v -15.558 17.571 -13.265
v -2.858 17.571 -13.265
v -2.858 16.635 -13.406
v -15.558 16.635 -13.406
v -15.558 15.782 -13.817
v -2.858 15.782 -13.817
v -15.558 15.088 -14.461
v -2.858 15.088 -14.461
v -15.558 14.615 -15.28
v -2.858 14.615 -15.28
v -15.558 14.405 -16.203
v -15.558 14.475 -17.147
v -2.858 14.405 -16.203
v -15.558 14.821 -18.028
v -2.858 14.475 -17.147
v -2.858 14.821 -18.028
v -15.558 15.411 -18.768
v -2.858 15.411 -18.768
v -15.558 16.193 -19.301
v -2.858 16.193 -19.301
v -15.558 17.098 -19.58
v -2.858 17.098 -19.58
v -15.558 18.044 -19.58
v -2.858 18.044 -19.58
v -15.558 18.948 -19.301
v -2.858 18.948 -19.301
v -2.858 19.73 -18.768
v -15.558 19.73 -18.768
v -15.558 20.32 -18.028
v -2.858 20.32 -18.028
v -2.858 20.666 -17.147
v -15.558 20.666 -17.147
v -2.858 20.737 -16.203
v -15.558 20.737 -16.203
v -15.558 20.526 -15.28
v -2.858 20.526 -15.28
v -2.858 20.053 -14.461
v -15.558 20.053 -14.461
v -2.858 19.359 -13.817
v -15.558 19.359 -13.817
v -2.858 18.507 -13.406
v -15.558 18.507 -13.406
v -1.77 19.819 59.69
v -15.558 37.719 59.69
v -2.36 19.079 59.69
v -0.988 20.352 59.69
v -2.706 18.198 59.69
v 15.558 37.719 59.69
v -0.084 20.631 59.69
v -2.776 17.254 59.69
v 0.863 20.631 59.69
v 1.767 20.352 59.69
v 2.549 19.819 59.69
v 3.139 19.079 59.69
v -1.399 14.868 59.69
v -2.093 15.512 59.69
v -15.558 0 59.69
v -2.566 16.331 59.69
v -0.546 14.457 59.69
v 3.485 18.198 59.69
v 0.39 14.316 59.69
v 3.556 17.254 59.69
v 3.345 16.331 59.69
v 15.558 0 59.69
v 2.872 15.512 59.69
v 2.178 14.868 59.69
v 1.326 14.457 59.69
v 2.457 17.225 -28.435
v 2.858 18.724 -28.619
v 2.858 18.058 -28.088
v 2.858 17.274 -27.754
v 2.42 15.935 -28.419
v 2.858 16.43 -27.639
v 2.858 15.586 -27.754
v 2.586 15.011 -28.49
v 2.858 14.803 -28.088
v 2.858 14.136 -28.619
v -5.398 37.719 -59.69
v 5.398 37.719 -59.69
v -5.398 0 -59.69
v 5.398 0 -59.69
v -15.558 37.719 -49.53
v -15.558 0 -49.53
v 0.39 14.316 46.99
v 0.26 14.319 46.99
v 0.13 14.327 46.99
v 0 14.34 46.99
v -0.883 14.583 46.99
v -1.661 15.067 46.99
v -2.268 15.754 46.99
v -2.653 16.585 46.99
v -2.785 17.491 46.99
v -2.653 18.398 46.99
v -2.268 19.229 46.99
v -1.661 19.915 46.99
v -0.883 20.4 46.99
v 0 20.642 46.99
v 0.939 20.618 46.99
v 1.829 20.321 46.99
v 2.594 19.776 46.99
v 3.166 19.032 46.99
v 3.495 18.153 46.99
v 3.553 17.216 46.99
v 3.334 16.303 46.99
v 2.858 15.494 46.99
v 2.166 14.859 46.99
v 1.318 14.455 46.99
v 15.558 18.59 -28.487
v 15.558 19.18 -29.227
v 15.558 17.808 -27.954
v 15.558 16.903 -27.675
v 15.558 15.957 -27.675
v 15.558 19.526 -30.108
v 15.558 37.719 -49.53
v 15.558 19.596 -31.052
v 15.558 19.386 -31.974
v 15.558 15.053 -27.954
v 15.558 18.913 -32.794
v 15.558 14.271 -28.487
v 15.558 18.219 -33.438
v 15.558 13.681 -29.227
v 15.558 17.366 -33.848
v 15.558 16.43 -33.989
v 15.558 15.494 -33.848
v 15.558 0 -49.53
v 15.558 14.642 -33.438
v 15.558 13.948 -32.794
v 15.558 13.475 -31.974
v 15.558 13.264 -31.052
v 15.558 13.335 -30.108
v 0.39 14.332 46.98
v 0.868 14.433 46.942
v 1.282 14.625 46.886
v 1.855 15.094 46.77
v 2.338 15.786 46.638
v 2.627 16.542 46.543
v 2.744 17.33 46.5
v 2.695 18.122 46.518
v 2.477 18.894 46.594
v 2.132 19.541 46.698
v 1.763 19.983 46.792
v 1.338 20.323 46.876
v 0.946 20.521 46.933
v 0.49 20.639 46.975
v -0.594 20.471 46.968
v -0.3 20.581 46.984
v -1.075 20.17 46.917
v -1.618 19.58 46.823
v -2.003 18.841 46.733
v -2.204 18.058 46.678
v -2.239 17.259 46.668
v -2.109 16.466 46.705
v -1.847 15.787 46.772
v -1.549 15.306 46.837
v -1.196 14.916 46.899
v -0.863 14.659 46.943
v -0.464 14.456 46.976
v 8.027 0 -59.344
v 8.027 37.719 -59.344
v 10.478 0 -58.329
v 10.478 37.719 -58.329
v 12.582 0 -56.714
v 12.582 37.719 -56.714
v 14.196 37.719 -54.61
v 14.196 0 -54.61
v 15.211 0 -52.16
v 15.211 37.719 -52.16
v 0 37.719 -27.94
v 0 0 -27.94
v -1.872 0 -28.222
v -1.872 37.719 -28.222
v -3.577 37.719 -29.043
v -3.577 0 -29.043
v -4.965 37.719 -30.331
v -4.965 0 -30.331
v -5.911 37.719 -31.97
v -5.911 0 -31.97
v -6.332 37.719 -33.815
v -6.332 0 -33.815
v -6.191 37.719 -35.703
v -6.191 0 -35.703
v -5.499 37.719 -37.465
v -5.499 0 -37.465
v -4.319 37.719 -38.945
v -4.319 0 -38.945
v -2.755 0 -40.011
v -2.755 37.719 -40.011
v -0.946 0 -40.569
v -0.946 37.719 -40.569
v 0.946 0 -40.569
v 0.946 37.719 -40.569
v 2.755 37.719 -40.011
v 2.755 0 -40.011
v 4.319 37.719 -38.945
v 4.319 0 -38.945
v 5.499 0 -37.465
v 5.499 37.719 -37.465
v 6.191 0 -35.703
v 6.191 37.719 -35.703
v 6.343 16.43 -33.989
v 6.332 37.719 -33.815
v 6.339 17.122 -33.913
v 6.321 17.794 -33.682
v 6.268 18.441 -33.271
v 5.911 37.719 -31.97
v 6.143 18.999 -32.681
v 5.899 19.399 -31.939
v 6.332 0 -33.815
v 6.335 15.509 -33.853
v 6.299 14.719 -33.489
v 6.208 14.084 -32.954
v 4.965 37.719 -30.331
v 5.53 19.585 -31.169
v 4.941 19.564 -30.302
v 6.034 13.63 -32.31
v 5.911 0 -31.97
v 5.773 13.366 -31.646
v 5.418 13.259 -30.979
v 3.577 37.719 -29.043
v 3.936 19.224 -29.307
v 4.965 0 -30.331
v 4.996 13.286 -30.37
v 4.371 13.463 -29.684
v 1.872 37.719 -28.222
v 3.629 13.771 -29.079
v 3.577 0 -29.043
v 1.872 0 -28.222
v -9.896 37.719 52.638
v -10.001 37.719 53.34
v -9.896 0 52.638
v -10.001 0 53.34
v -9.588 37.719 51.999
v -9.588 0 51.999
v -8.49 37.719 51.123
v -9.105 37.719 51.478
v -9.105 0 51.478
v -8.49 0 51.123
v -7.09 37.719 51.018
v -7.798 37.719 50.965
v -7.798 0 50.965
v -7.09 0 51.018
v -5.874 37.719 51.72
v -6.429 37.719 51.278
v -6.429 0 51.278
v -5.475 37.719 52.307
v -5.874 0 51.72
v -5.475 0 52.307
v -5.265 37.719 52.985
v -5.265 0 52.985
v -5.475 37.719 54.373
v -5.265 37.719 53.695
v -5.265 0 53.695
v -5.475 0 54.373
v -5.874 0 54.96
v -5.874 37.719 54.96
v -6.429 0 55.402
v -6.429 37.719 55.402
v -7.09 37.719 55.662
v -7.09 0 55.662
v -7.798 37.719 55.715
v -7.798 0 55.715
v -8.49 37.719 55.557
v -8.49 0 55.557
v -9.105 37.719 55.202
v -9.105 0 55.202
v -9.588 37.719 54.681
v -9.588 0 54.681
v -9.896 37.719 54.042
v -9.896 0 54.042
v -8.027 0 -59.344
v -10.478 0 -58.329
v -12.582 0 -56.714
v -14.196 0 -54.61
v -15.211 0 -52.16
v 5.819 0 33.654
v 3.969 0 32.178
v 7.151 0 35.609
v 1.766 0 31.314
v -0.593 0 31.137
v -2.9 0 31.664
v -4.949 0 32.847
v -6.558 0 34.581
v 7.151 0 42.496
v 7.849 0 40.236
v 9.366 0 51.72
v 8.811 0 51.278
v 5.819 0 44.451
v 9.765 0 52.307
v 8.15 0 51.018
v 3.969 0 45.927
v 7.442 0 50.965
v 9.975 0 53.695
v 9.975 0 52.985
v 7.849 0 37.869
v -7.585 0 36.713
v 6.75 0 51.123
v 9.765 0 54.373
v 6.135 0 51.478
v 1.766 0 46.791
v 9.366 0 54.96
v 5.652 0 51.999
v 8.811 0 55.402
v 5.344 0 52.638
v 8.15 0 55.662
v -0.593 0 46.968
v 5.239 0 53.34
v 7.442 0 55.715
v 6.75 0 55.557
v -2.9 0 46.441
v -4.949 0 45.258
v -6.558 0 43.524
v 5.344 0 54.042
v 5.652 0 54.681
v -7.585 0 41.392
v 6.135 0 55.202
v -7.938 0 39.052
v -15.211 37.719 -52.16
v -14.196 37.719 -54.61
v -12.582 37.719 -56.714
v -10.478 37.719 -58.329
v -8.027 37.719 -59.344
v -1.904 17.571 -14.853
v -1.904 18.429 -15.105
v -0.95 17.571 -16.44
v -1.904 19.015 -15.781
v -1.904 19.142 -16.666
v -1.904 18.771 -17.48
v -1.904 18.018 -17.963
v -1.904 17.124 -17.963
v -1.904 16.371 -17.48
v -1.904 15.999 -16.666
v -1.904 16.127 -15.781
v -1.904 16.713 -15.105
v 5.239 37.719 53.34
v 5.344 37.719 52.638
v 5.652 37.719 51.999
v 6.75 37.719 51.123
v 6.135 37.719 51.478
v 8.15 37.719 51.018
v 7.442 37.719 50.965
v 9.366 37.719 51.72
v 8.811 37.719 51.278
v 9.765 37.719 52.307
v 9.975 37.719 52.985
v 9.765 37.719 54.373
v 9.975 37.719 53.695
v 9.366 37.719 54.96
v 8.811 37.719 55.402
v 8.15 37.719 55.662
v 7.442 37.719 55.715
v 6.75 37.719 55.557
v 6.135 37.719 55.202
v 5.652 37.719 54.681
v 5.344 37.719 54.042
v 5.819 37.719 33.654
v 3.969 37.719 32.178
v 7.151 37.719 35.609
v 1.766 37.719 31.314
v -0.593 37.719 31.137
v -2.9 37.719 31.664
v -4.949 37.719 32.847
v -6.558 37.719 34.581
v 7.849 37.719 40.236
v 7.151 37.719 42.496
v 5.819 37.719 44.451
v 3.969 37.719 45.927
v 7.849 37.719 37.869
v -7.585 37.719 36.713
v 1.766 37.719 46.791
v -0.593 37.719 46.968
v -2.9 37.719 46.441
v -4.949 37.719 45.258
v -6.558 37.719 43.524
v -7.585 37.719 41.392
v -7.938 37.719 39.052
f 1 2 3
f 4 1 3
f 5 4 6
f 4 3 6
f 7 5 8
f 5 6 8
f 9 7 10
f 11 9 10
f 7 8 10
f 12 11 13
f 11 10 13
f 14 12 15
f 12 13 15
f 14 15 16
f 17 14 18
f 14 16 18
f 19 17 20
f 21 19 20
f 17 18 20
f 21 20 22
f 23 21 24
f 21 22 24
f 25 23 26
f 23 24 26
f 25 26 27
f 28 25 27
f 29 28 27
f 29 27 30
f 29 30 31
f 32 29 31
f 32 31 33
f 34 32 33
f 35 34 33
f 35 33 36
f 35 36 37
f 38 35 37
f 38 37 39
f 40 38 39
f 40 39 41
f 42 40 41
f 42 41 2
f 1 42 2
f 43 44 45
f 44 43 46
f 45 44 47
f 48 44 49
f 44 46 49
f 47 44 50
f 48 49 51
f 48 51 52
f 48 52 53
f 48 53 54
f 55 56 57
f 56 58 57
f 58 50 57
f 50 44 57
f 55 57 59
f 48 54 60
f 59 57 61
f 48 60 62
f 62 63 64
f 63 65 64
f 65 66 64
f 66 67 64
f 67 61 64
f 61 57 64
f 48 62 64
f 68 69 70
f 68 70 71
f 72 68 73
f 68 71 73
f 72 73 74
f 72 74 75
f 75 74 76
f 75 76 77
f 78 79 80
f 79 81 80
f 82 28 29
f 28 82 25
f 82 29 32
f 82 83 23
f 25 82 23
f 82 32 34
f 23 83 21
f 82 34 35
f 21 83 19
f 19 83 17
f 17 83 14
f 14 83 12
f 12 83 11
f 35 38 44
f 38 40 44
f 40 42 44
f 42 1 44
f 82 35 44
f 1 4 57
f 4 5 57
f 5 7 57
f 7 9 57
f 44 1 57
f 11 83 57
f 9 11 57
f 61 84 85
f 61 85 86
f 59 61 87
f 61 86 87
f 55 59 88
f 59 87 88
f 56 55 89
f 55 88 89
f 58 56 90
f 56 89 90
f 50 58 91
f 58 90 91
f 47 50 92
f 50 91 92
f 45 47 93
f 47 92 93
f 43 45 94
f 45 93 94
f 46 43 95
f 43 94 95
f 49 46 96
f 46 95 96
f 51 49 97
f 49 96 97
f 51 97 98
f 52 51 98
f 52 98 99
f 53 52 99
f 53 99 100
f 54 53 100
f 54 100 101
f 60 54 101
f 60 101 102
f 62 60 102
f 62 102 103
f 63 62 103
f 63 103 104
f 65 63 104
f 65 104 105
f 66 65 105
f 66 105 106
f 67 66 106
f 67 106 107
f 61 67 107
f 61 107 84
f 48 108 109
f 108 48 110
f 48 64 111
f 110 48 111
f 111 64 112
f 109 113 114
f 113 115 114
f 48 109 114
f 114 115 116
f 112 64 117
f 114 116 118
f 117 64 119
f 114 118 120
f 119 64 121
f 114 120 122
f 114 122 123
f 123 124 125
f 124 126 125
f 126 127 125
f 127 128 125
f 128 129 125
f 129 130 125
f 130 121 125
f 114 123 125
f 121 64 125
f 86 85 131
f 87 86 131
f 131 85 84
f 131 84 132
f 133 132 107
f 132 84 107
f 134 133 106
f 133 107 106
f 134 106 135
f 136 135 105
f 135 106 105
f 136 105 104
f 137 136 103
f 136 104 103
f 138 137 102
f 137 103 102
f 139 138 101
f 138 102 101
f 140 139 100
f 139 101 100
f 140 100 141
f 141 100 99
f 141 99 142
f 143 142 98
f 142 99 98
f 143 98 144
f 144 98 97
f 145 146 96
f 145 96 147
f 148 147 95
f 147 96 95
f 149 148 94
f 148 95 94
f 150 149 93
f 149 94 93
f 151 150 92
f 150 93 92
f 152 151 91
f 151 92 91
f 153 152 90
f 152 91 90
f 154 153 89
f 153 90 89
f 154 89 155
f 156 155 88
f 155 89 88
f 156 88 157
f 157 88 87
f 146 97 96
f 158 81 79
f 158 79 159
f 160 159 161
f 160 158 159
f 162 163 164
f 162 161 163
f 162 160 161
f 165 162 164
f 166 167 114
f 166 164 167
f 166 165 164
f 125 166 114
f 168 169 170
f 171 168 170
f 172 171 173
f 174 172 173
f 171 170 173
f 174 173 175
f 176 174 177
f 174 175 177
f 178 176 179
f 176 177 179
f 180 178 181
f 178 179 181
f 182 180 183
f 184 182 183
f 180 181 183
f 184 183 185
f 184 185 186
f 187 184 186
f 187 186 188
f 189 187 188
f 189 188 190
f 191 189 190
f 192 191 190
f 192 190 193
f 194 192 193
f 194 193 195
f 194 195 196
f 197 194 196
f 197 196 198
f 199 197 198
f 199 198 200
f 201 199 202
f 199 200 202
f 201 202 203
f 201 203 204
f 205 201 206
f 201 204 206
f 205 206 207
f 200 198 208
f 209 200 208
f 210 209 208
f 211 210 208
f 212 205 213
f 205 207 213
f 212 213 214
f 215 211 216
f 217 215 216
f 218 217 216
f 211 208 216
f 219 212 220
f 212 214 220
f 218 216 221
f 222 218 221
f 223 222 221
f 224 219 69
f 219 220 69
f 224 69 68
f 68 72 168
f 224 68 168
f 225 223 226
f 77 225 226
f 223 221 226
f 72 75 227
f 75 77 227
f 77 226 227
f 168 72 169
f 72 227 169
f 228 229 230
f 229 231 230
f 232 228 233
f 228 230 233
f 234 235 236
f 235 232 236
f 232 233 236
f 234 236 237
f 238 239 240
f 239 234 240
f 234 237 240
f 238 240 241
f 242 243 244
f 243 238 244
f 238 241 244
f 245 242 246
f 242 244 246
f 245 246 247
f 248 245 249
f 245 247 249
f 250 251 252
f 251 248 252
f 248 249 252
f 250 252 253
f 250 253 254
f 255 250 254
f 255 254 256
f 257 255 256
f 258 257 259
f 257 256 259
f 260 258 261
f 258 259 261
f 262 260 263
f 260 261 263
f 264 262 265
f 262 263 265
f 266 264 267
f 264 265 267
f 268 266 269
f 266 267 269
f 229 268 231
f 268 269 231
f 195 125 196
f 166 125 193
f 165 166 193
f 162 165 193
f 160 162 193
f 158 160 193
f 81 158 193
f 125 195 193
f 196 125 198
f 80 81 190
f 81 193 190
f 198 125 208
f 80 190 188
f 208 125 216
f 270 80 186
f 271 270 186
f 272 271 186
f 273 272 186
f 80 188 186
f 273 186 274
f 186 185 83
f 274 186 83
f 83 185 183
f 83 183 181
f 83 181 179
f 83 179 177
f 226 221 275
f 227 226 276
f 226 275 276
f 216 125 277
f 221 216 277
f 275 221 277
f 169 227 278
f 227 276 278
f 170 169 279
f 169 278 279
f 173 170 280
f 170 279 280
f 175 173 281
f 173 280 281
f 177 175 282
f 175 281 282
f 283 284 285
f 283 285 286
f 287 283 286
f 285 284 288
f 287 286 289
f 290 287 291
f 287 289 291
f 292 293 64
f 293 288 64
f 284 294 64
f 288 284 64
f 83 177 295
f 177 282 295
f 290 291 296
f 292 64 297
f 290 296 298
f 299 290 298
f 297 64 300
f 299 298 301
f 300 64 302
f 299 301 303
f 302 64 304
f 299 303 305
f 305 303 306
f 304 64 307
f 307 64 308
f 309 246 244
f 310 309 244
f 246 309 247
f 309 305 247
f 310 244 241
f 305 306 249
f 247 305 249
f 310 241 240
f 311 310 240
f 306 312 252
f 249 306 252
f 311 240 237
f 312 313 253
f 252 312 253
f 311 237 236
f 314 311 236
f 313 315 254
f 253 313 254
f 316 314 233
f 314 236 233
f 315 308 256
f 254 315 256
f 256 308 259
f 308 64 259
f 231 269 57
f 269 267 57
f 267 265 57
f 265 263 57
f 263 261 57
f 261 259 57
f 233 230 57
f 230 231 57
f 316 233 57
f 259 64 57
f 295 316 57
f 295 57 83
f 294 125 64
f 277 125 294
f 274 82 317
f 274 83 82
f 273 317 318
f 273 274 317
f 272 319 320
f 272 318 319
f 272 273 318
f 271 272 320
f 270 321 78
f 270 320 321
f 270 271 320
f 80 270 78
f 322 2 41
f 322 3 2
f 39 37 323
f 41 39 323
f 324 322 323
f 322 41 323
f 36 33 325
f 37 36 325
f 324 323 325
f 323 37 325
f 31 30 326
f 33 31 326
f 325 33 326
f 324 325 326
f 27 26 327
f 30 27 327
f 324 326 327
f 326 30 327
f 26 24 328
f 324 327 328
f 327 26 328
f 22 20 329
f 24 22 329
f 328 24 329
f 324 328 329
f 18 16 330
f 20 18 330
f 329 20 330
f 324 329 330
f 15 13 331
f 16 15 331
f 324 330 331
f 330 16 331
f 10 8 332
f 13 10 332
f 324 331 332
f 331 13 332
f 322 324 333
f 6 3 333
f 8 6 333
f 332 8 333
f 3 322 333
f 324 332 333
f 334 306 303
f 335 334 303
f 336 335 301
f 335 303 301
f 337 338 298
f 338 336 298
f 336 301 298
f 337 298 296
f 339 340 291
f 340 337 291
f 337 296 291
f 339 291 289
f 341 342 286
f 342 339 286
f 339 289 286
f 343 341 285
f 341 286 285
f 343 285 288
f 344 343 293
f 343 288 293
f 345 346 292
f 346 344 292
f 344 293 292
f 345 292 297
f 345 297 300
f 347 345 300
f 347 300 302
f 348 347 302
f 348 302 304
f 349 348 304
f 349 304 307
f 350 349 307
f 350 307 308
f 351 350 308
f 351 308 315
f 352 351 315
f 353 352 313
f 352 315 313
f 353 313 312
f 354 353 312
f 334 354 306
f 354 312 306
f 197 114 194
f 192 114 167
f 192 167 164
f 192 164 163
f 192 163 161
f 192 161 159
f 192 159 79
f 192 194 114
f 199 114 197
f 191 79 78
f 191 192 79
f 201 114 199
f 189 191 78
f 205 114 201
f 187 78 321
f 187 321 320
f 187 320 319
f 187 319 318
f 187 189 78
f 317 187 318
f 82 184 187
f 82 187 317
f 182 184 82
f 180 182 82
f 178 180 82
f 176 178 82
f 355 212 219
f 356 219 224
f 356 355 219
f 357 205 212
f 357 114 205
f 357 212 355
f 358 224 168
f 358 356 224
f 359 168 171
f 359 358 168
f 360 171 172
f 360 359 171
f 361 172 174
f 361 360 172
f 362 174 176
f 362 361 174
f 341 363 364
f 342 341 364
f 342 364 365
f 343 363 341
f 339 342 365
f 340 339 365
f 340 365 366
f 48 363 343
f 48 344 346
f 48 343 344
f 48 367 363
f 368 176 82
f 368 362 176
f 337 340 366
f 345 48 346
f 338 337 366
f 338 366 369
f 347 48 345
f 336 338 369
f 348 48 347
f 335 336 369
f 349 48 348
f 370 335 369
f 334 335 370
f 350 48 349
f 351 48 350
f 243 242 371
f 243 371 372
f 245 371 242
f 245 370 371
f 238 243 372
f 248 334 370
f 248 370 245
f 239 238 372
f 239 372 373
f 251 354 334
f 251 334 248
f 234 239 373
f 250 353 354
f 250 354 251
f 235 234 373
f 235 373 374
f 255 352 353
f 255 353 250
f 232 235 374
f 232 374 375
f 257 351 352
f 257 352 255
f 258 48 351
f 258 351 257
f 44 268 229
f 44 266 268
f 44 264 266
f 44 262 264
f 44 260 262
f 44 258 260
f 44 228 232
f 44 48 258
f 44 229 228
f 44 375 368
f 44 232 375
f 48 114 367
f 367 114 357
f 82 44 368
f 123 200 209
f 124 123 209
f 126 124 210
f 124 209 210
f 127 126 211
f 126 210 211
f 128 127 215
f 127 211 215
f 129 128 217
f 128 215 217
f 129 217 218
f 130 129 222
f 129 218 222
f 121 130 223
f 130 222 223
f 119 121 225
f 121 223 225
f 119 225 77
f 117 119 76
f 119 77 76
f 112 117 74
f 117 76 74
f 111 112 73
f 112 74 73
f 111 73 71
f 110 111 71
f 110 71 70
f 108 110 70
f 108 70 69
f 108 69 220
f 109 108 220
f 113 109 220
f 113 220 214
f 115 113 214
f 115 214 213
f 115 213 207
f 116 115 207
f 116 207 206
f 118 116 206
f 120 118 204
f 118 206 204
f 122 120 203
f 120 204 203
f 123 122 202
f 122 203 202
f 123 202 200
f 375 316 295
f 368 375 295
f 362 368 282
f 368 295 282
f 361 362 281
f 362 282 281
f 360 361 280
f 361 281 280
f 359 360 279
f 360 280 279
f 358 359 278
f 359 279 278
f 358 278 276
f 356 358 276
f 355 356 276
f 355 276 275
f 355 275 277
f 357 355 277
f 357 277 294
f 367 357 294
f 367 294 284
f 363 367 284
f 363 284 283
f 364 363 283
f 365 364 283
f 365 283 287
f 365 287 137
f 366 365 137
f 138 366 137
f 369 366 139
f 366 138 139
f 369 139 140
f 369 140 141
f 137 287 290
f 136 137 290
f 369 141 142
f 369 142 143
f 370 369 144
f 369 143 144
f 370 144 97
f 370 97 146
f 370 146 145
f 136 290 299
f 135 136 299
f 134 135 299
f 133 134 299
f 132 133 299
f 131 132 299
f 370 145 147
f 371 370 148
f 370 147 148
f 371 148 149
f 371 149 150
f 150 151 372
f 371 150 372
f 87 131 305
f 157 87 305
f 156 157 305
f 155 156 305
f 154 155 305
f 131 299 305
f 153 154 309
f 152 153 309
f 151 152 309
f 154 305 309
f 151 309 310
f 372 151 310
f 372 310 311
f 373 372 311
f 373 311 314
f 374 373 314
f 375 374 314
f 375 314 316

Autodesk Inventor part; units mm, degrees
ref_plane "YZ Plane" through (0, 0, 0) normal (1, 0, 0) x (0, 1, 0)
ref_plane "XZ Plane" through (0, 0, 0) normal (0, 1, 0) x (-1, 0, 0)
ref_plane "XY Plane" through (0, 0, 0) normal (0, 0, 1) x (1, 0, 0)
sketch "Sketch1" plane through (0, 0, 0) normal (0, 1, 0) x (-1, 0, 0)
  line L0 (-5.3975, -59.69) -> (5.3975, -59.69)
  line L1 (15.5575, -49.53) -> (15.5575, 59.69)
  line L2 (15.5575, 59.69) -> (-15.5575, 59.69)
  line L3 (-15.5575, 59.69) -> (-15.5575, -49.53)
  line L4 (-15.5575, -59.69) -> (15.5575, 59.69) construction
  line L5 (15.5575, -59.69) -> (-15.5575, 59.69) construction
  arc A0 (5.3975, -59.69) -> (15.5575, -49.53) centre (5.3975, -49.53) ccw
  arc A1 (-15.5575, -49.53) -> (-5.3975, -59.69) centre (-5.3975, -49.53) ccw
  circle A2 centre (0, 39.0525) radius 7.9375
  line L6 (0, -93.6381) -> (0, 115.0739)
  circle A3 centre (7.62, 53.34) radius 2.3813
  circle A4 centre (-7.62, 53.34) radius 2.3813
  point P0 (0, 0)
  point P1 (0, 0)
  dimension "d0" = 119.38
  dimension "d1" = 31.115
  dimension "d2" = 10.16
  dimension "d3" = 15.875
  dimension "d4" = 20.6375
  dimension "d51" = 4.7625
  dimension "d52" = 15.24
  dimension "d53" = 6.35
extrude "Extrusion1" add sketch "Sketch1" along normal blind 37.719 contours A1 L3 L2 L6 A2 L0 | L6 A2 L2 L1 A0 L0
sketch "Sketch2" plane through (0, 37.719, 0) normal (0, 1, 0) x (1, 0, 0)
  line L0 (5.3975, 59.69) -> (-5.3975, 59.69) projected
  point P0 (0, 0)
  point P1 (0, 34.29)
  dimension "d7" = 25.4
hole "Hole1" at (0, 37.719, -34.29) direction (0, -1, 0) diameter 12.7 end through all
hole "Hole3" at (0.3897, 17.4911, 59.69) direction (0, 0, -1) diameter 6.35 depth 12.7 tip angle 118
hole "Hole4" at (-15.5575, 17.5708, -16.4401) direction (1, 0, 0) diameter 6.35 depth 12.7 tip angle 118
hole "Hole5" at (15.5575, 16.4302, -30.8144) direction (-1, 0, 0) diameter 6.35 depth 12.7 tip angle 118
properties part number "Fixture_Base"
